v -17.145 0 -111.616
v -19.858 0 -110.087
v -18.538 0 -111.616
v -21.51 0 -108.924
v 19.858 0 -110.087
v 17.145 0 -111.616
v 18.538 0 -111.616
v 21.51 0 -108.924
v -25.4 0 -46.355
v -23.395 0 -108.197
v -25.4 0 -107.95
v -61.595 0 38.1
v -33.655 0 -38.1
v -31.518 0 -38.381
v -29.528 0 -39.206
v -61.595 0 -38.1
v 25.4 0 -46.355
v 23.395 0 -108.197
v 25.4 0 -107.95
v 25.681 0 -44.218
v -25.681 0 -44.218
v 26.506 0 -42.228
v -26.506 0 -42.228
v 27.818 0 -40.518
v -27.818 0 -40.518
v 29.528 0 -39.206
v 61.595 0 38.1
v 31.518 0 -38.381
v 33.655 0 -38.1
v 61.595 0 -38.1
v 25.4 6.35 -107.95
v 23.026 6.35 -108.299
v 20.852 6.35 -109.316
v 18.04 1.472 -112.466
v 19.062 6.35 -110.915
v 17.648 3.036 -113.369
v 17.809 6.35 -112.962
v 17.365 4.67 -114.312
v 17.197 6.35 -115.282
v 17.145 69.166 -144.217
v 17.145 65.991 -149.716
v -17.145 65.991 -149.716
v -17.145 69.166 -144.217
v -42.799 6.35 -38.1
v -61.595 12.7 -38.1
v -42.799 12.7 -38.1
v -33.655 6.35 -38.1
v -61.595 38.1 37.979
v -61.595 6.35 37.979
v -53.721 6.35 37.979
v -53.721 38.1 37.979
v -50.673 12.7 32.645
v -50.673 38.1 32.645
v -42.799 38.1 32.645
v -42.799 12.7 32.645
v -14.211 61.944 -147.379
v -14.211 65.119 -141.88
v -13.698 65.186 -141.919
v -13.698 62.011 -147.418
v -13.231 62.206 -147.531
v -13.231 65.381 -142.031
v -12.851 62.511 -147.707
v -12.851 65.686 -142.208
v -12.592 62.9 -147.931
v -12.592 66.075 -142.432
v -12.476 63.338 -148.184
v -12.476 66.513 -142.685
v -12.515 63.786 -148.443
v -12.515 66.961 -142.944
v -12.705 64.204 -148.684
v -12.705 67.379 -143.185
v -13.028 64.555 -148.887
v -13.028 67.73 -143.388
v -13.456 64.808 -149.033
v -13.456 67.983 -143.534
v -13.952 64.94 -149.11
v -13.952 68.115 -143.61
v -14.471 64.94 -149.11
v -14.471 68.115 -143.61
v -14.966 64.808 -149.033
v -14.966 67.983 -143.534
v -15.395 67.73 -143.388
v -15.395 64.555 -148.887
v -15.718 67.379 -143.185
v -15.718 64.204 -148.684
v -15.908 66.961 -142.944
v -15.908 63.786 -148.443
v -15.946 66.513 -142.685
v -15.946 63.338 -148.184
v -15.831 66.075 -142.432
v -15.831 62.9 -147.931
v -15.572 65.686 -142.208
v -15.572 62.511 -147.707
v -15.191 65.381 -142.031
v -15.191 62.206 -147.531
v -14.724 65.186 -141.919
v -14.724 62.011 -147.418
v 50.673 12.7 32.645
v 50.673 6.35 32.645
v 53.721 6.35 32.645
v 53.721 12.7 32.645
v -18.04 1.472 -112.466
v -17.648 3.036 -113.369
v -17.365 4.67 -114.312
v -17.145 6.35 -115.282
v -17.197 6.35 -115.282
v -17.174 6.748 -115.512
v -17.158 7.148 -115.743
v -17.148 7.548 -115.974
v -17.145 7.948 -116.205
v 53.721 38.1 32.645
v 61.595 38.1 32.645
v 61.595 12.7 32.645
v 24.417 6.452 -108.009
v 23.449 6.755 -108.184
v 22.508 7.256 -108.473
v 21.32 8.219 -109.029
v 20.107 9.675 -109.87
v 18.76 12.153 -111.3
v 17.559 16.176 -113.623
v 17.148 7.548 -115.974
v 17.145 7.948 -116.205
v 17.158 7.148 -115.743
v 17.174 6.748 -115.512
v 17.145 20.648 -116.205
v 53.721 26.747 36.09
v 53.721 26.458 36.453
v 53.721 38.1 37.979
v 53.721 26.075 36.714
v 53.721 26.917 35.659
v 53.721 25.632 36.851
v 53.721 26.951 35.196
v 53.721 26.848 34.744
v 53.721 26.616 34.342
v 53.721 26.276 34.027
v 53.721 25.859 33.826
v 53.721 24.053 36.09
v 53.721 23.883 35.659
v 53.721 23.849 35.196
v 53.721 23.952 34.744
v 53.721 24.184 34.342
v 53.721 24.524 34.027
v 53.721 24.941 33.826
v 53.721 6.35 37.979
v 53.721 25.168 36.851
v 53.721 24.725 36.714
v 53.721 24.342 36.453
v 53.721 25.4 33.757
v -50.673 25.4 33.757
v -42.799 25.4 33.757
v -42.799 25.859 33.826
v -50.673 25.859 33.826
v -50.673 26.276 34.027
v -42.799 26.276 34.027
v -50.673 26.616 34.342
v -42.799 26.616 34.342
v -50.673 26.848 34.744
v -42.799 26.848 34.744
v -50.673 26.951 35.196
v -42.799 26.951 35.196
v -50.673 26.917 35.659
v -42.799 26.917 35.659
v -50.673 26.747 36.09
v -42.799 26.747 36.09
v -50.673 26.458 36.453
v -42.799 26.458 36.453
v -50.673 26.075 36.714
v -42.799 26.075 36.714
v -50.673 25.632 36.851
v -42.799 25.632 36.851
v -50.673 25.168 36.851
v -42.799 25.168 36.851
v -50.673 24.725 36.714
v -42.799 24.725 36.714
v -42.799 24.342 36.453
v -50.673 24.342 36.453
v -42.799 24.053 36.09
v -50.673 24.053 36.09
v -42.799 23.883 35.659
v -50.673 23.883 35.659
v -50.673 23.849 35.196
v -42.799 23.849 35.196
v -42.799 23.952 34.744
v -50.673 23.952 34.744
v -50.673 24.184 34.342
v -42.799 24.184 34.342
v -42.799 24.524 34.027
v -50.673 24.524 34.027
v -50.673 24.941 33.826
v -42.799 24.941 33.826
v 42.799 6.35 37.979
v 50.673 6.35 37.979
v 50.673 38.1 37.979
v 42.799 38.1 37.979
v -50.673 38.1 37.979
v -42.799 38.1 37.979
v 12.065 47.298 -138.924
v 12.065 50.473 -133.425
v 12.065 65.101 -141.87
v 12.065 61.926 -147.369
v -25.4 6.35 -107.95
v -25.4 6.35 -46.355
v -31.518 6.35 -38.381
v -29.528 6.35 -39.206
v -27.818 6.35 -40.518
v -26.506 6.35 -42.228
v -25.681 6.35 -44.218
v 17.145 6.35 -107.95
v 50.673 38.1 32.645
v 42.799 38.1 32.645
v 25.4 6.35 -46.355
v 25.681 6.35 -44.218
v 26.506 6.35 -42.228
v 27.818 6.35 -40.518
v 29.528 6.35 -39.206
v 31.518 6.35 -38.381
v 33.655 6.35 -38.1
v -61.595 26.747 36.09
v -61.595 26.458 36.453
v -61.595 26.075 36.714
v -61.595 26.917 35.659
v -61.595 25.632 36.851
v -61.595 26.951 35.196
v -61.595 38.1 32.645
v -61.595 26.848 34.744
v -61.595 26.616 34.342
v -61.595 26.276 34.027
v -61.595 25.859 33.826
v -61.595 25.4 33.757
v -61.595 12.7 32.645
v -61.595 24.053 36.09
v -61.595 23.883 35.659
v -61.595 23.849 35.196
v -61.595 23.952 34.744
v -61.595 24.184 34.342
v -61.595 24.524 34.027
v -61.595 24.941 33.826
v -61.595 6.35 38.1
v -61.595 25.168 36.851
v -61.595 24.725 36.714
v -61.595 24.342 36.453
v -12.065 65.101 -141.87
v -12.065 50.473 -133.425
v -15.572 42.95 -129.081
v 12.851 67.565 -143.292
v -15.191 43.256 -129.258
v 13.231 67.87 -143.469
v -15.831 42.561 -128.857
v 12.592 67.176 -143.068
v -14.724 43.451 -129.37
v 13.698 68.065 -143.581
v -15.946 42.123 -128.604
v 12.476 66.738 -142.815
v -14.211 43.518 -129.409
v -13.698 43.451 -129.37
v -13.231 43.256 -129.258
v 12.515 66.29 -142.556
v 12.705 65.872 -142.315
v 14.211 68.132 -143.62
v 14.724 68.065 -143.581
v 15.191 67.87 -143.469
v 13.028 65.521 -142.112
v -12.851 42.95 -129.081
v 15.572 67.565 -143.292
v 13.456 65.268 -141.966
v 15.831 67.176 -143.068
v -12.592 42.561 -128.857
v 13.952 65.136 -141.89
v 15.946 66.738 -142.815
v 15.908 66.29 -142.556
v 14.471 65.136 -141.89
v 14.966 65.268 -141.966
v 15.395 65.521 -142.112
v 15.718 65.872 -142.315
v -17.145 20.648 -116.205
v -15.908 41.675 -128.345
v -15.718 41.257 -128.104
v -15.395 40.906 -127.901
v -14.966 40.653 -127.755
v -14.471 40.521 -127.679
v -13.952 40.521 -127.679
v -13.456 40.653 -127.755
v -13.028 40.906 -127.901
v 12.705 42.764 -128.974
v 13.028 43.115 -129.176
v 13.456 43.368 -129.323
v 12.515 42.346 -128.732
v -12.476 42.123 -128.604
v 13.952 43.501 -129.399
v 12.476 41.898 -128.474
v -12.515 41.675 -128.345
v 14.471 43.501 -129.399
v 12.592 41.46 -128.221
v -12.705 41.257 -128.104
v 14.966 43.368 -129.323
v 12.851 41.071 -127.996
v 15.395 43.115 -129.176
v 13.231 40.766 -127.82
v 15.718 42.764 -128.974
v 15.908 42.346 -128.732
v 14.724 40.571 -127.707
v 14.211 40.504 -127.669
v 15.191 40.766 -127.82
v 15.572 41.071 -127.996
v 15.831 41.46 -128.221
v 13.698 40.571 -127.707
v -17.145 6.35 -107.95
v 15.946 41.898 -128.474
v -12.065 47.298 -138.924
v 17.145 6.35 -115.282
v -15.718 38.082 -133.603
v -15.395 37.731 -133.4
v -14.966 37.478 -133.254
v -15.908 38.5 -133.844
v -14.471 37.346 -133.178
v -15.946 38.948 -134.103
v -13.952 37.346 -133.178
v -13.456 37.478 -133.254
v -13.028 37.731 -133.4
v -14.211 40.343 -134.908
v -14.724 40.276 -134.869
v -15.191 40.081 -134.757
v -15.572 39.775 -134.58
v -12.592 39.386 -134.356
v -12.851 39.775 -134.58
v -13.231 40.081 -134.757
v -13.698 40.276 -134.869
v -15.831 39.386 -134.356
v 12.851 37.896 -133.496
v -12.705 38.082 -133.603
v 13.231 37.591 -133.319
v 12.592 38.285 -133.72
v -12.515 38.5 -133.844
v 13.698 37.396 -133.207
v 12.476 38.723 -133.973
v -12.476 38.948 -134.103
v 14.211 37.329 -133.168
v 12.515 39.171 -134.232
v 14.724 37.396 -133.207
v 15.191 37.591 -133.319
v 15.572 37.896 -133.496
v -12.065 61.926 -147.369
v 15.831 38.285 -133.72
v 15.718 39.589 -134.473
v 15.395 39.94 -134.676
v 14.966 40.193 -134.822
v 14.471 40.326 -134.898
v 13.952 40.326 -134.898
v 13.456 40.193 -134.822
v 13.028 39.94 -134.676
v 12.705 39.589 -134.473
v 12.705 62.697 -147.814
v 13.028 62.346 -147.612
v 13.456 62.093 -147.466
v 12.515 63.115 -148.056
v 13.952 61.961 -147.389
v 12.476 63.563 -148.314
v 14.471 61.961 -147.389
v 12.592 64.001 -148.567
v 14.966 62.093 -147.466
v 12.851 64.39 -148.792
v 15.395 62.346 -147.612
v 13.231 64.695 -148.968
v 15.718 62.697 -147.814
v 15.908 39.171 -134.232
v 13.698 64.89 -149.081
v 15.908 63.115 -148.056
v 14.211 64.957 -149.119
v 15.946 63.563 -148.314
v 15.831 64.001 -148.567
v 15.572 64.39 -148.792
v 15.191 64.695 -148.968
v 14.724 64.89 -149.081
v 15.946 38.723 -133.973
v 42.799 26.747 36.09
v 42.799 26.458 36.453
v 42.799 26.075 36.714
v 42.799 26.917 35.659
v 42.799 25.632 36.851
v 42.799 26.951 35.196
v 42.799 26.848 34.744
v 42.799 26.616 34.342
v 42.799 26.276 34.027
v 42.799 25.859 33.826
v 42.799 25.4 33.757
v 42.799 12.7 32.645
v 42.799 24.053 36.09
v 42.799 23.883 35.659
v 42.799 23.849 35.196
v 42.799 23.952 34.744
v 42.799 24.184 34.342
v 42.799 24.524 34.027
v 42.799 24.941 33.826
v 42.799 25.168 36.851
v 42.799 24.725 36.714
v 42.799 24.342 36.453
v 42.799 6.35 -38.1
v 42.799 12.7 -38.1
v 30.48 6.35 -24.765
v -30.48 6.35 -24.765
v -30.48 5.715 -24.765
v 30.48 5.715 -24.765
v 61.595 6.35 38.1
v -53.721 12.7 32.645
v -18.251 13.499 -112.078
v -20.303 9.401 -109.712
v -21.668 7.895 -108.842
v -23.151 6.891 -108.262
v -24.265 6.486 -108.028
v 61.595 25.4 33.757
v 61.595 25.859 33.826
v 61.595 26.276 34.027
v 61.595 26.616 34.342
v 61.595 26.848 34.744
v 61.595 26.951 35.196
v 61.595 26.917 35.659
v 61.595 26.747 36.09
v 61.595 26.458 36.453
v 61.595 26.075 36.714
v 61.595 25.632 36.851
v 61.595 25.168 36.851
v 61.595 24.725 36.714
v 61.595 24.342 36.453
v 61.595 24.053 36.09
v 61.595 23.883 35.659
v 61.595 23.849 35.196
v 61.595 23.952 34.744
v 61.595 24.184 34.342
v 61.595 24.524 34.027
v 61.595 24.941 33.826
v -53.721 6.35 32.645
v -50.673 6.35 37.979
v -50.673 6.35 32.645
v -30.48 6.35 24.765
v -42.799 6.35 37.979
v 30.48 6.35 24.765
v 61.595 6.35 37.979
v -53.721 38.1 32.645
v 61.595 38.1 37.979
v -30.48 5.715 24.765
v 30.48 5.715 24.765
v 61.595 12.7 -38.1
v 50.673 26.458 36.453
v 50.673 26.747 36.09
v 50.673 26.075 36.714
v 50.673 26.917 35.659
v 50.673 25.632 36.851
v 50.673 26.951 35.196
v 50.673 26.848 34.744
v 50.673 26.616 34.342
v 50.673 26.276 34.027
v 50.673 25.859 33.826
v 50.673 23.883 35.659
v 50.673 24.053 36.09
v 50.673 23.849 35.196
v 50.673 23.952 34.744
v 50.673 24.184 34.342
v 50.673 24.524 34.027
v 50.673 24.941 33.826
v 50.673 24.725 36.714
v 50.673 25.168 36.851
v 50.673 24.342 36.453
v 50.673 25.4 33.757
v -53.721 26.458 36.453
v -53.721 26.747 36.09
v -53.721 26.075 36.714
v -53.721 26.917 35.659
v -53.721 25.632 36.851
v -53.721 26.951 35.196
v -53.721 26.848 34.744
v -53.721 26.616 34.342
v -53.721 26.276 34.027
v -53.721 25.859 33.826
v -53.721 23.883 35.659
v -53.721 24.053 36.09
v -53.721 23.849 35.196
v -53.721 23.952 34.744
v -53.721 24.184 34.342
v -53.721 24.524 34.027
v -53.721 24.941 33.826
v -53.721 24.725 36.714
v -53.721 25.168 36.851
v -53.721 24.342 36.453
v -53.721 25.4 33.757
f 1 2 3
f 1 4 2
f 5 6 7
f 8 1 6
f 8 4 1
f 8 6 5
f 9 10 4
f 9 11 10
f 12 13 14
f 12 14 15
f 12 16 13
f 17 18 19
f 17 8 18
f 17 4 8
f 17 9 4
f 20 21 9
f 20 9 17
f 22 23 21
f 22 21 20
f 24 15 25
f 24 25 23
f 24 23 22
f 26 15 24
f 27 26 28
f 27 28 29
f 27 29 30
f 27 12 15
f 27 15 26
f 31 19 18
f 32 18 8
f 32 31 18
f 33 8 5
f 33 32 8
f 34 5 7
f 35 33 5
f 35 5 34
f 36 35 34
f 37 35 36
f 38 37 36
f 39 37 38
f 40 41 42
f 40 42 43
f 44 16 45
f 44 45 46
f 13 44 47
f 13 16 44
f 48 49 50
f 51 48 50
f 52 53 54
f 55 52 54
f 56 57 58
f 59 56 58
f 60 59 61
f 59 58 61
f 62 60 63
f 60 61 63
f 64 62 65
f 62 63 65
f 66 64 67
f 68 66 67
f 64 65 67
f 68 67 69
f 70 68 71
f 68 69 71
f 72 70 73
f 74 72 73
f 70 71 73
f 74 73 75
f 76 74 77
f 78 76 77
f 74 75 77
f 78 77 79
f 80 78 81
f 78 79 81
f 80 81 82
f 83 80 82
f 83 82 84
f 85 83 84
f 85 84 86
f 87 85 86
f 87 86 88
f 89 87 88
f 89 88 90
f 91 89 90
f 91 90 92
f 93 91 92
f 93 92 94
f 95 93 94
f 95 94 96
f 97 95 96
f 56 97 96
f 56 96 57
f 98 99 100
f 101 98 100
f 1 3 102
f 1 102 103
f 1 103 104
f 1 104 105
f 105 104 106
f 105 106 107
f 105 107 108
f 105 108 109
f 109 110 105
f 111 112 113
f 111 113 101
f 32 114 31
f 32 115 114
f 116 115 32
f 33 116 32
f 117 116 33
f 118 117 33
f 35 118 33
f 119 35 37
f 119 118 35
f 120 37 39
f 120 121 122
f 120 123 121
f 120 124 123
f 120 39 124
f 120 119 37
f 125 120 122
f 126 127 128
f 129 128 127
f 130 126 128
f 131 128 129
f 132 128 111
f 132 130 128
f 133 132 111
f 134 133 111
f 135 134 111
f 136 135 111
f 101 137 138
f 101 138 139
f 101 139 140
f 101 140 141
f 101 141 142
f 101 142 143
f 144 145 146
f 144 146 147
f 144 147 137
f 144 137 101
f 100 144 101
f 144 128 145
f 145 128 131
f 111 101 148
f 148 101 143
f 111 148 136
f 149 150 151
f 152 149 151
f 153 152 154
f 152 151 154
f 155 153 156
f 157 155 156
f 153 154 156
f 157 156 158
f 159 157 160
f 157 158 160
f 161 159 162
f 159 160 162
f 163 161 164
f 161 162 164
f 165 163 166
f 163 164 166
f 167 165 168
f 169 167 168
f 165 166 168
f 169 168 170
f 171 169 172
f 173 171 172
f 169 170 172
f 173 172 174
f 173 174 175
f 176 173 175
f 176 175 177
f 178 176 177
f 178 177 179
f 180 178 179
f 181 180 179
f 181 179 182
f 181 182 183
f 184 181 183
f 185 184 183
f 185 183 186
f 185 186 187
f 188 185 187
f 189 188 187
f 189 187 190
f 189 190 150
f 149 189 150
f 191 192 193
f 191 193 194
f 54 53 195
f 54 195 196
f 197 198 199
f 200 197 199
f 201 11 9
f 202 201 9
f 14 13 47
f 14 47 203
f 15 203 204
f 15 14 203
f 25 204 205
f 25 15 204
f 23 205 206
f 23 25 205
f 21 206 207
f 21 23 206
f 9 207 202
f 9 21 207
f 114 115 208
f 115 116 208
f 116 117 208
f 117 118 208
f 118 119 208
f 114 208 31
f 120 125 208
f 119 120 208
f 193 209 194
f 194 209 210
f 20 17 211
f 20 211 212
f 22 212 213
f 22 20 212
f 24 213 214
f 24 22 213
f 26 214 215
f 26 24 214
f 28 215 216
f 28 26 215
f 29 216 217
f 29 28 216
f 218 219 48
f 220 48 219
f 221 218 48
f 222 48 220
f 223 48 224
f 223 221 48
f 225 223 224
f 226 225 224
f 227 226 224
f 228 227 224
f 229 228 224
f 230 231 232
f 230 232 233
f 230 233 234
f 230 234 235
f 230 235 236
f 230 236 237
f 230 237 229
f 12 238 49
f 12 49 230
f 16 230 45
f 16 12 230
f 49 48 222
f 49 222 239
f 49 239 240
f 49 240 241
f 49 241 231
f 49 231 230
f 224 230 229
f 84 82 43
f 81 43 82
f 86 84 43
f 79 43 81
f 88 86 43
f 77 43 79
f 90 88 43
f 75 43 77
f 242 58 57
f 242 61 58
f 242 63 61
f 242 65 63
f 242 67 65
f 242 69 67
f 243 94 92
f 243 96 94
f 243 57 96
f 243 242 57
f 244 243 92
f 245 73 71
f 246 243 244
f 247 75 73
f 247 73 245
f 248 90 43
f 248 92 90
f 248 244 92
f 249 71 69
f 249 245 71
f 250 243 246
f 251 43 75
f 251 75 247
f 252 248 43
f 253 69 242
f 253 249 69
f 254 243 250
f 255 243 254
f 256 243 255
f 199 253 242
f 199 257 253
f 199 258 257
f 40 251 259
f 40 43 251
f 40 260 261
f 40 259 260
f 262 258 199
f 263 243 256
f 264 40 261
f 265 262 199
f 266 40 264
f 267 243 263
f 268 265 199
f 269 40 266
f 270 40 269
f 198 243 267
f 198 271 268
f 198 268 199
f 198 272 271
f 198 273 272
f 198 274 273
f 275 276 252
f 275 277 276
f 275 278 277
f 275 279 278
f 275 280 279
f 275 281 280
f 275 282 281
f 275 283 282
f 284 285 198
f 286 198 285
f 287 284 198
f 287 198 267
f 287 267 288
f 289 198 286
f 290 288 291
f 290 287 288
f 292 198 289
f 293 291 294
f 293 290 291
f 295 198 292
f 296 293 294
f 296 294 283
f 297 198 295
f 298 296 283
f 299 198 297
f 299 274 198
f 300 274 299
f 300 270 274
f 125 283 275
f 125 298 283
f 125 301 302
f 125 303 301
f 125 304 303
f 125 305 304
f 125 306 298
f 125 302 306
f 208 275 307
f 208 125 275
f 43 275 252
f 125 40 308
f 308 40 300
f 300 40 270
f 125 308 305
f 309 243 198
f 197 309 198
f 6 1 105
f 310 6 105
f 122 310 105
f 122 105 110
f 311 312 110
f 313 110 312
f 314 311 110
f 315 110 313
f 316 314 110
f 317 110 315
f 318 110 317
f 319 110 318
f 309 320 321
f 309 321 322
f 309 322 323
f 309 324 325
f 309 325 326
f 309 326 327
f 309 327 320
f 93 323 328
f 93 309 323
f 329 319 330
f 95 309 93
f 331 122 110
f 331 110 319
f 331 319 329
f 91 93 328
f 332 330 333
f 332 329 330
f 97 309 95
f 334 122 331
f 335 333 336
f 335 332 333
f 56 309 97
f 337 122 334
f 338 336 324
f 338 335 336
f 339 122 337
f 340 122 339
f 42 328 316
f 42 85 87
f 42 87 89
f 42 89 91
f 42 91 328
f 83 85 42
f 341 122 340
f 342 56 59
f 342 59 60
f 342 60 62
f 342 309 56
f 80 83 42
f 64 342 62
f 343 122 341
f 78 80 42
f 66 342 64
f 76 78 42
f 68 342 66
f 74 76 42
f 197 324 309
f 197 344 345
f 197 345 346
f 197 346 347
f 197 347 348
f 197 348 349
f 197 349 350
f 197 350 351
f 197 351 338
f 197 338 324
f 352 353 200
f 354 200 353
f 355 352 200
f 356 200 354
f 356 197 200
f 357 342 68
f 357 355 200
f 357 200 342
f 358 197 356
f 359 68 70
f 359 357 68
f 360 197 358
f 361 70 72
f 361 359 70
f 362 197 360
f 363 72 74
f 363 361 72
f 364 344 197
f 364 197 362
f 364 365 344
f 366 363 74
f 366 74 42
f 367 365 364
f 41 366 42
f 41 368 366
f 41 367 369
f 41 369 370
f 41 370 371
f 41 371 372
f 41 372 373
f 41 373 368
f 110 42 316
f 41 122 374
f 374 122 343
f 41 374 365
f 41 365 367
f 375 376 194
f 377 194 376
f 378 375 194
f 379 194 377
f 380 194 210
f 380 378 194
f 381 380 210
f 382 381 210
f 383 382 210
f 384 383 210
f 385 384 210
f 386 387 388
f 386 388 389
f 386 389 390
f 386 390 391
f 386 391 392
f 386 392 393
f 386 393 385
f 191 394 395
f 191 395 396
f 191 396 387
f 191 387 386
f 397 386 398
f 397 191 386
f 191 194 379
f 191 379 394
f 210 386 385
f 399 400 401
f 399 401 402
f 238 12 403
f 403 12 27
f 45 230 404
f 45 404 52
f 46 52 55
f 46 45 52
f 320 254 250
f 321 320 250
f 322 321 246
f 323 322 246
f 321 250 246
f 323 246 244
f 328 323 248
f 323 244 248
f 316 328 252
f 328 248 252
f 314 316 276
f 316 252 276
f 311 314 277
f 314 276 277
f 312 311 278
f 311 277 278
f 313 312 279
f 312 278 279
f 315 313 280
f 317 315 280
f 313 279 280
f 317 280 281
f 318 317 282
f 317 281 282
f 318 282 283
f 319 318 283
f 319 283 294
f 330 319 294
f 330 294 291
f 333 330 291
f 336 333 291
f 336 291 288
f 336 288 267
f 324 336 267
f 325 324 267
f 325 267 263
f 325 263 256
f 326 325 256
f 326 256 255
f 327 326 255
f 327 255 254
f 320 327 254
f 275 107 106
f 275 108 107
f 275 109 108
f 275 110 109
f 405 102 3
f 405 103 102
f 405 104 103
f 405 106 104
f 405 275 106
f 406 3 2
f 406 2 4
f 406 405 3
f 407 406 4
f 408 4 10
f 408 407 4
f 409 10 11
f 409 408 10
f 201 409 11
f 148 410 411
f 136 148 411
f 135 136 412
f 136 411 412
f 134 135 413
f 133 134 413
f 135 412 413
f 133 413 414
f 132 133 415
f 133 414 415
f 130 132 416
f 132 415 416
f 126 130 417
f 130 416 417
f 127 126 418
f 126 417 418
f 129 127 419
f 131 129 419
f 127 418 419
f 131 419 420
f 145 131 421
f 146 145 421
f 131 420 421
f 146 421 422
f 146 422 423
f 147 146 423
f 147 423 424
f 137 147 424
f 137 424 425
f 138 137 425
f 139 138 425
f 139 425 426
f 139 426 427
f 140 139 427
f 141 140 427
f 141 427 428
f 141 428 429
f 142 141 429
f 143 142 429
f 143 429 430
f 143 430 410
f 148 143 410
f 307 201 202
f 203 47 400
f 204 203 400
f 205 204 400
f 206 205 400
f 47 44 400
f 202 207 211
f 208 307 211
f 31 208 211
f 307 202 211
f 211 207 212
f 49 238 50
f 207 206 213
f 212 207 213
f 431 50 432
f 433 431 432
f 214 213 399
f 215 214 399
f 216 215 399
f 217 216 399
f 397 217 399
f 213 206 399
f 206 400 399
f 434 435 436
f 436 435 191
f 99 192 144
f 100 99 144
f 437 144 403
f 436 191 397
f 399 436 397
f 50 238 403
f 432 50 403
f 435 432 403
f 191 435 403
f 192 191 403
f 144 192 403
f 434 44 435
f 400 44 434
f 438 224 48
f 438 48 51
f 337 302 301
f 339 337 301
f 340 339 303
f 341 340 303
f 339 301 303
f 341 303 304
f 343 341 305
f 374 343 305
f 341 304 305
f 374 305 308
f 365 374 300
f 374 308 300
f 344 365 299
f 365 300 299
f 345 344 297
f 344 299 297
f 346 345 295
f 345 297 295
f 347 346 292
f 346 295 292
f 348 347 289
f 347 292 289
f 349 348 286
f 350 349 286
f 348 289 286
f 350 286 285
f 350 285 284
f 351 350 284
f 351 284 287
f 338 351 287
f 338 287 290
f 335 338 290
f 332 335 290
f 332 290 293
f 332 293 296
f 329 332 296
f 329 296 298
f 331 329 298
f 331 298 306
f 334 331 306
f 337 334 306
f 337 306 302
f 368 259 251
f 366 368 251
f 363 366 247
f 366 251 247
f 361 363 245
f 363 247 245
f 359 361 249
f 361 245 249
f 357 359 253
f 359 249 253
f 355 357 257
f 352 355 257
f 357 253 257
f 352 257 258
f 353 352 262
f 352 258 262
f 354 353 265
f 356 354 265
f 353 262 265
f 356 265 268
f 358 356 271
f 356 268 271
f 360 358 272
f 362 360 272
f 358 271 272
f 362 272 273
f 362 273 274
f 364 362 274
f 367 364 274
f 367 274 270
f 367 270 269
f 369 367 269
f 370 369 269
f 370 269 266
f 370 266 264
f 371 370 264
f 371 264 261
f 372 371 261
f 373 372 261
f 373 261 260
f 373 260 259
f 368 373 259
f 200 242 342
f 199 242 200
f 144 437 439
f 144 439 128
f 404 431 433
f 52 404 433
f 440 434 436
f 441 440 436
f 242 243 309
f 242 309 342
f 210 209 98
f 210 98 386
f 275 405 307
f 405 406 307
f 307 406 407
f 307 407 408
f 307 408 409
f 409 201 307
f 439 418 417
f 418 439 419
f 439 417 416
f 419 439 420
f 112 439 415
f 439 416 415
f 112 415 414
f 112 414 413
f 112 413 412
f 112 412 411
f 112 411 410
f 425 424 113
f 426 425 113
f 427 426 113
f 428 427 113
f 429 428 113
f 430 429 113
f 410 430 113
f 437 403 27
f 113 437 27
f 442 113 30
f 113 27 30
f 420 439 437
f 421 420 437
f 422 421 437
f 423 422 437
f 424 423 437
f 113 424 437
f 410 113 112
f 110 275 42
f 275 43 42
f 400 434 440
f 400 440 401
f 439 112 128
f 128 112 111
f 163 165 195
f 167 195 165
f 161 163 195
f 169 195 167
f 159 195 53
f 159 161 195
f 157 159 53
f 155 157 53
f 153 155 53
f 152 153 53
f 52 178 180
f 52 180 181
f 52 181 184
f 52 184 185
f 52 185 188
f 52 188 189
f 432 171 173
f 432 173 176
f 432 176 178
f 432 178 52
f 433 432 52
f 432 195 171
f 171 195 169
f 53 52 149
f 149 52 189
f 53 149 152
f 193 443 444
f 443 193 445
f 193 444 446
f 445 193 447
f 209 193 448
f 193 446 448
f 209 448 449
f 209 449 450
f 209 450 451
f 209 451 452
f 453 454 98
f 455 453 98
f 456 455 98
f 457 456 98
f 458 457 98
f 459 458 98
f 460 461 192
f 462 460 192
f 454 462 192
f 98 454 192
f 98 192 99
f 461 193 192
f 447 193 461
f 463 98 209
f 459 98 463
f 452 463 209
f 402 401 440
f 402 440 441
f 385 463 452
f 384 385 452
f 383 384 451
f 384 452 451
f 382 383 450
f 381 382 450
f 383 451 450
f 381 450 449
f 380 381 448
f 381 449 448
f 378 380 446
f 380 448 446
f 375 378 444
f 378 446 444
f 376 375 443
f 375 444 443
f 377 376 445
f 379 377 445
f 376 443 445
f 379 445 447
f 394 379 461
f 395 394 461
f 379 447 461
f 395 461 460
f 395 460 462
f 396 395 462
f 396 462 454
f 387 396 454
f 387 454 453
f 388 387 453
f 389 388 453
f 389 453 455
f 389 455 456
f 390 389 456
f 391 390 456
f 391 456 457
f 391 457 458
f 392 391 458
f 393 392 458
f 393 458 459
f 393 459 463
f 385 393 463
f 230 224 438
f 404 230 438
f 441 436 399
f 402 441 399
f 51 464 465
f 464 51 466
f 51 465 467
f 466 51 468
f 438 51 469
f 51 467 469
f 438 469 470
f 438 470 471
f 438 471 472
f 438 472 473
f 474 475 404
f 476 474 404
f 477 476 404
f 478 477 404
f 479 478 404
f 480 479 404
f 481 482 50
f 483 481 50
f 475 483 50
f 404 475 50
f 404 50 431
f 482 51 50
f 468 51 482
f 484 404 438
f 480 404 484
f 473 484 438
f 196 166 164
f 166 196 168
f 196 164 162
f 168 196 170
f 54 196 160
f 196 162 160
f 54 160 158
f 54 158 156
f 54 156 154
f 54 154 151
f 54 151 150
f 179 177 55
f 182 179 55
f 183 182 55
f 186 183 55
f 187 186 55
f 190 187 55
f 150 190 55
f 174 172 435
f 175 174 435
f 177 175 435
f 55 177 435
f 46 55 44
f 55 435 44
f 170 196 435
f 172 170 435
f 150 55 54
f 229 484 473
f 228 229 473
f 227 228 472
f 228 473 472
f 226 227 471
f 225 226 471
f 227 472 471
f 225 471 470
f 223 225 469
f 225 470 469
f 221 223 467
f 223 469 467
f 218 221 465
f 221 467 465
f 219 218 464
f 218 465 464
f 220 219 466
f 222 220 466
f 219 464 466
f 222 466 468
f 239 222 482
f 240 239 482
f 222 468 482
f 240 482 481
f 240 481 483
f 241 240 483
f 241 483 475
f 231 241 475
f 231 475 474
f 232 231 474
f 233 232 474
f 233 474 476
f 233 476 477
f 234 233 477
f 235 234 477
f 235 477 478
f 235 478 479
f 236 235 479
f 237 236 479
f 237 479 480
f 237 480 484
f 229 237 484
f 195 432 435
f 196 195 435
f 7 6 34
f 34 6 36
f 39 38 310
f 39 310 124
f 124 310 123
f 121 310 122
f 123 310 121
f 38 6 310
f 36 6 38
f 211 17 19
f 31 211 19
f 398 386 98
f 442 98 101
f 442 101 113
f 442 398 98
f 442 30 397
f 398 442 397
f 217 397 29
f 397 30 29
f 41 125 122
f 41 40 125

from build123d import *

# Parameters (mm, degrees)
BOSS_EXTRUDE1_DEPTH   = 6.35
SKETCH2_W             = 60.96
SKETCH2_H             = 49.53
CUT_EXTRUDE1_DEPTH    = 0.635
SKETCH5_W             = 7.874
SKETCH5_H             = 5.334
BOSS_EXTRUDE2_DEPTH   = 31.75
BOSS_EXTRUDE2_2_DEPTH = 31.75
SKETCH7_R             = 1.55575
CUT_EXTRUDE2_DEPTH    = 169.168334118
BOSS_EXTRUDE3_START   = -8.255
BOSS_EXTRUDE3_DEPTH   = 34.29
SKETCH9_R             = 1.7399
SKETCH9_W             = 24.13
SKETCH9_H             = 16.891
CUT_EXTRUDE3_DEPTH    = 175.333671147
SKETCH11_W            = 18.796
SKETCH11_H            = 70.745386066
BOSS_EXTRUDE6_DEPTH   = 6.35
FILLET1_R             = 8.255


with BuildPart() as part:
    # Sketch1 → Boss-Extrude1 (new body)
    with BuildSketch(Plane(origin=(0, 0, 0), x_dir=(1, 0, 0), z_dir=(0, 1, 0))):
        Polygon((-25.4, 38.1), (-61.595, 38.1), (-61.595, -38.1), (61.595, -38.1), (61.595, 38.1), (25.4, 38.1), (25.4, 107.95), (-25.4, 107.95), align=None)
    extrude(amount=BOSS_EXTRUDE1_DEPTH)

    # Sketch2 → Cut-Extrude1 (cut)
    with BuildSketch(Plane(origin=(0, 6.35, 0), x_dir=(1, 0, 0), z_dir=(0, 1, 0))):
        Rectangle(SKETCH2_W, SKETCH2_H)
    extrude(amount=-CUT_EXTRUDE1_DEPTH, mode=Mode.SUBTRACT)


with BuildPart() as body_2:
    # Sketch5 → Boss-Extrude2 (new body)
    with BuildSketch(Plane(origin=(0, 6.35, 0), x_dir=(1, 0, 0), z_dir=(0, 1, 0))):
        with Locations((-46.736, -35.312386066)):
            Rectangle(SKETCH5_W, SKETCH5_H)
    boss_extrude2 = extrude(amount=BOSS_EXTRUDE2_DEPTH)


with BuildPart() as body_3:
    # Sketch5 → Boss-Extrude2 2 (new body)
    with BuildSketch(Plane(origin=(0, 6.35, 0), x_dir=(1, 0, 0), z_dir=(0, 1, 0))):
        with Locations((-57.658, -35.312386066)):
            Rectangle(SKETCH5_W, SKETCH5_H)
    boss_extrude2_2 = extrude(amount=BOSS_EXTRUDE2_2_DEPTH)


with BuildPart() as part_1:
    add(part.part)

    # Mirror4: Boss-Extrude2, Boss-Extrude2 2 across plane
    add(boss_extrude2.mirror(Plane(origin=(0, 0, 0), x_dir=(0, 0, 1), z_dir=(1, 0, 0))))
    add(boss_extrude2_2.mirror(Plane(origin=(0, 0, 0), x_dir=(0, 0, 1), z_dir=(1, 0, 0))))


with BuildPart() as cut_extrude2_tool:
    # Sketch7 → Cut-Extrude2 (new, through all)
    with BuildSketch(Plane(origin=(61.595, 0, 0), x_dir=(0, 0, -1), z_dir=(1, 0, 0))):
        with Locations((-35.312386066, 25.4)):
            Circle(SKETCH7_R)
    extrude(amount=-CUT_EXTRUDE2_DEPTH)


with BuildPart() as part_2:
    add(part_1.part)

    # Cut-Extrude2: cut by cut_extrude2_tool
    add(cut_extrude2_tool.part, mode=Mode.SUBTRACT)

    # Sketch8 → Boss-Extrude3 (add)
    with BuildSketch(Plane(origin=(25.4, 0, 0), x_dir=(0, 0, -1), z_dir=(1, 0, 0)).offset(BOSS_EXTRUDE3_START)):
        Polygon((111.616174209, 0), (149.716174209, 65.991135768), (144.216912895, 69.166135768), (107.95, 6.35), (107.95, 0), align=None)
    extrude(amount=-BOSS_EXTRUDE3_DEPTH)

    # Sketch9 → Cut-Extrude3 (cut, through all)
    with BuildSketch(Plane(origin=(0, -45.156221169, -78.212869343), x_dir=(1, 0, 0), z_dir=(0, 0.49999999999997874, 0.866025403784451))):
        with Locations(Location((-14.2113, 129.074387105, 0), (0, 0, 270))):
            Circle(SKETCH9_R)
        with Locations(Location((14.2113, 129.074387105, 0), (0, 0, 90))):
            Circle(SKETCH9_R)
        with Locations(Location((14.2113, 100.651787105, 0), (0, 0, 270))):
            Circle(SKETCH9_R)
        with Locations(Location((-14.2113, 100.651787105, 0), (0, 0, 90))):
            Circle(SKETCH9_R)
        with Locations((0, 118.868787105)):
            Rectangle(SKETCH9_W, SKETCH9_H)
    extrude(amount=-CUT_EXTRUDE3_DEPTH, mode=Mode.SUBTRACT)



with BuildPart() as body_2_1:
    add(body_2.part)

    # Cut-Extrude2: cut by cut_extrude2_tool
    add(cut_extrude2_tool.part, mode=Mode.SUBTRACT)


with BuildPart() as body_3_1:
    add(body_3.part)

    # Cut-Extrude2: cut by cut_extrude2_tool
    add(cut_extrude2_tool.part, mode=Mode.SUBTRACT)


with BuildPart() as part_3:
    add(part_2.part)

    add(body_2_1.part)  # Boss-Extrude6 merges body 2

    add(body_3_1.part)  # Boss-Extrude6 merges body 3
    # Sketch11 → Boss-Extrude6 (add)
    with BuildSketch(Plane(origin=(0, 6.35, 0), x_dir=(1, 0, 0), z_dir=(0, 1, 0))):
        with Locations((-52.197, 2.727306967)):
            Rectangle(SKETCH11_W, SKETCH11_H)
        with Locations((52.197, 2.727306967)):
            Rectangle(SKETCH11_W, SKETCH11_H)
    extrude(amount=BOSS_EXTRUDE6_DEPTH)

    # Fillet1
    # the kernel refuses this fillet: 8.255 mm, written as the material it adds along each edge
    with BuildSketch(Plane(origin=(-17.145, 26.9875, -107.95), x_dir=(-1, 0, 0), z_dir=(0, -1, 0))) as fillet1_piece_1_section:
        with BuildLine():
            CenterArc((FILLET1_R, FILLET1_R), FILLET1_R, 180, 90)
            Line((0, FILLET1_R), (0, 0))
            Line((0, 0), (FILLET1_R, 0))
        make_face()
    fillet1_piece_1 = extrude(amount=26.9875, mode=Mode.PRIVATE)
    fillet1_piece_1 = split(fillet1_piece_1, bisect_by=Plane(origin=(-18.026106342, 6.35, -111.490654818), z_dir=(0, 1, 0)), keep=Keep.TOP, mode=Mode.PRIVATE)
    fillet1_piece_1 = split(fillet1_piece_1, bisect_by=Plane(origin=(-18.026106342, 10.193700171, -110.169161328), z_dir=(0, -0.4999999999999879, -0.8660254037844457)), keep=Keep.TOP, mode=Mode.PRIVATE)
    fillet1_piece_1 = split(fillet1_piece_1, bisect_by=Plane(origin=(-18.026106342, 7.018700171, -115.668422642), z_dir=(0, 0.49999999999999845, 0.8660254037844396)), keep=Keep.TOP, mode=Mode.PRIVATE)
    add(fillet1_piece_1)
    with BuildSketch(Plane(origin=(-17.145, 6.35, -107.95), x_dir=(-1, 0, 0), z_dir=(0, -1, 0))) as fillet1_piece_2_section:
        with BuildLine():
            CenterArc((FILLET1_R, FILLET1_R), FILLET1_R, 180, 90)
            Line((0, FILLET1_R), (0, 0))
            Line((0, 0), (FILLET1_R, 0))
        make_face()
    fillet1_piece_2 = extrude(amount=6.35, mode=Mode.PRIVATE)
    fillet1_piece_2 = split(fillet1_piece_2, bisect_by=Plane(origin=(-19.126244344, 4.717934574, -107.007726587), z_dir=(0, -0.4999999999999879, -0.8660254037844457)), keep=Keep.TOP, mode=Mode.PRIVATE)
    fillet1_piece_2 = split(fillet1_piece_2, bisect_by=Plane(origin=(-19.126244344, 1.542934574, -112.506987901), z_dir=(0, 0.49999999999999845, 0.8660254037844396)), keep=Keep.TOP, mode=Mode.PRIVATE)
    add(fillet1_piece_2)
    with BuildSketch(Plane(origin=(17.145, 26.9875, -107.95), x_dir=(1, 0, 0), z_dir=(0, -1, 0))) as fillet1_piece_3_section:
        with BuildLine():
            CenterArc((FILLET1_R, -FILLET1_R), FILLET1_R, 90, 90)
            Line((0, -FILLET1_R), (0, 0))
            Line((0, 0), (FILLET1_R, 0))
        make_face()
    fillet1_piece_3 = extrude(amount=26.9875, mode=Mode.PRIVATE)
    fillet1_piece_3 = split(fillet1_piece_3, bisect_by=Plane(origin=(18.026106342, 6.35, -111.490654818), z_dir=(0, 1, 0)), keep=Keep.TOP, mode=Mode.PRIVATE)
    fillet1_piece_3 = split(fillet1_piece_3, bisect_by=Plane(origin=(18.026106342, 10.193700171, -110.169161328), z_dir=(0, -0.4999999999999879, -0.8660254037844457)), keep=Keep.TOP, mode=Mode.PRIVATE)
    fillet1_piece_3 = split(fillet1_piece_3, bisect_by=Plane(origin=(18.026106342, 7.018700171, -115.668422642), z_dir=(0, 0.49999999999999845, 0.8660254037844396)), keep=Keep.TOP, mode=Mode.PRIVATE)
    add(fillet1_piece_3)
    with BuildSketch(Plane(origin=(17.145, 6.35, -107.95), x_dir=(1, 0, 0), z_dir=(0, -1, 0))) as fillet1_piece_4_section:
        with BuildLine():
            CenterArc((FILLET1_R, -FILLET1_R), FILLET1_R, 90, 90)
            Line((0, -FILLET1_R), (0, 0))
            Line((0, 0), (FILLET1_R, 0))
        make_face()
    fillet1_piece_4 = extrude(amount=6.35, mode=Mode.PRIVATE)
    fillet1_piece_4 = split(fillet1_piece_4, bisect_by=Plane(origin=(19.126244344, 4.717934574, -107.007726587), z_dir=(0, -0.4999999999999879, -0.8660254037844457)), keep=Keep.TOP, mode=Mode.PRIVATE)
    fillet1_piece_4 = split(fillet1_piece_4, bisect_by=Plane(origin=(19.126244344, 1.542934574, -112.506987901), z_dir=(0, 0.49999999999999845, 0.8660254037844396)), keep=Keep.TOP, mode=Mode.PRIVATE)
    add(fillet1_piece_4)
    with BuildSketch(Plane(origin=(-25.4, 0, -38.1), x_dir=(-1, 0, 0), z_dir=(0, 1, 0)), Plane(origin=(25.4, 0, -38.1), x_dir=(0, 0, -1), z_dir=(0, 1, 0))) as fillet1_piece_5:
        with BuildLine():
            CenterArc((FILLET1_R, -FILLET1_R), FILLET1_R, 90, 90)
            Line((0, -FILLET1_R), (0, 0))
            Line((0, 0), (FILLET1_R, 0))
        make_face()
    extrude(amount=6.35)


solid = part_3.part
